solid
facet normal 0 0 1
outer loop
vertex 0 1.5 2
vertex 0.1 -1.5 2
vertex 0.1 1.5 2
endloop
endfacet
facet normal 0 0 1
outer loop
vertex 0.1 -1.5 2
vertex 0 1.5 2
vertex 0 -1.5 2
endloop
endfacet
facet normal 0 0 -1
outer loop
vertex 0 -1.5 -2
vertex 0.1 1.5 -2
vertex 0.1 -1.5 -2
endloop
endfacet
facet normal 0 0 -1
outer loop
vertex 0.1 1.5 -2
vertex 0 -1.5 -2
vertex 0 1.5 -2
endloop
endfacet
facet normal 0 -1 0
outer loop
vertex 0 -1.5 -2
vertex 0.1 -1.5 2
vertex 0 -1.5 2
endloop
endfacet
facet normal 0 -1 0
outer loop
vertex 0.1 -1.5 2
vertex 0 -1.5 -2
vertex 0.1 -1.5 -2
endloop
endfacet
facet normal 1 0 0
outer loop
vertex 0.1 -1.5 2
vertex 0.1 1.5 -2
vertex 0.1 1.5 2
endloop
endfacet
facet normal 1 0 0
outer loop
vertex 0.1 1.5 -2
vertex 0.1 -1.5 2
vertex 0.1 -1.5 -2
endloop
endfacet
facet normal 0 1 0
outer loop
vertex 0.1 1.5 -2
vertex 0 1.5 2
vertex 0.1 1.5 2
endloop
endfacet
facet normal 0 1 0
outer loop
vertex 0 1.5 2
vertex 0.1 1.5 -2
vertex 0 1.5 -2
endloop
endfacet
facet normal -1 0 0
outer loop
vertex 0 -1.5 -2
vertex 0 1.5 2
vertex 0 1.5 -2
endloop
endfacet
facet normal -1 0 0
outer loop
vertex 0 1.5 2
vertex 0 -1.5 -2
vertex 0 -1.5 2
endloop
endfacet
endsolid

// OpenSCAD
dl=0.1;  //cm
dc=0.01; //cm espessura da camada de chumbo

// base de acrílico
translate([dl/2,0,0]) color("gray",alpha=0.3) cube([dl,3,4],true);

//// pares de linhas paralelas
//dz1=0.01; //cm
//for(i=[1:30])
//    // 100 p.l./cm == 1 p.l./0.01cm
//    translate([-dc/2,0.75,i*dz1-1]) color("DimGray",1.0)
//        cube([dc,1,dz1/2],true);
//
//dz2=0.02; //cm
//for(i=[1:18])
//    // 50 p.l./cm == 1 p.l./0.02cm
//    translate([-dc/2,0.75,0.4+i*dz2-1]) color("DimGray",1.0)
//        cube([dc,1,dz2/2],true);
//
//dz3=0.04; //cm
//for(i=[1:12])
//    // 25 p.l./cm == 1 p.l./0.04cm
//    translate([-dc/2,0.75,0.85+i*dz3-1]) color("DimGray",1.0)
//        cube([dc,1,dz3/2],true);
//
//dz4=0.08; //cm
//for(i=[1:7])
//    // 12.5 p.l./cm == 1 p.l./0.08cm
//    translate([-dc/2,0.75,1.4+i*dz4-1]) color("DimGray",1.0)
//        cube([dc,1,dz4/2],true);
//
//z=1.5;
//for(i=[-6.5:2:6.5]) {
//    vertice = [
//    [0,-i*0.1,z],      // 0
//    [0,-(i+1)*0.1,z],
//    [0,0.1*(-(i+1)*0.1),-z],
//    [0,0.1*(-i*0.1),-z],      // 3
//    [-dc,0.1*(-i*0.1),-z],    // 4
//    [-dc,0.1*(-(i+1)*0.1),-z],
//    [-dc,(-(i+1)*0.1),z],
//    [-dc,(-i*0.1),z]     // 7
//    ];
//
//    face = [
//    [0,1,2,3],
//    [4,5,6,7],
//    [5,4,3,2],
//    [7,6,1,0],
//    [6,5,2,1],
//    [0,3,4,7]
//    ];
//
//    translate([0,-0.75,0]) color("DimGray",1.0) polyhedron(vertice,face);
//}
//font = "Liberation Sans";
//{
//    text1 = "5.0 LP/mm";
//    translate([0,-0.4,1.6])color("DimGray",1.0)
//    rotate([90, 0, -90]) {
//        linear_extrude(height = dc) {
//            text(text = str(text1), font = font, size = 0.1, 
//                                         valign = "baseline");
//        }
//    }
//}
//{
//    text2 = "50.0 LP/mm";
//    translate([0,-0.35,-1.7])color("DimGray",1.0)
//    rotate([90, 0, -90]) {
//        linear_extrude(height = dc) {
//            text(text = str(text2), font = font, size = 0.1, 
//                                         valign = "baseline");
//        }
//    }
//}
// 
